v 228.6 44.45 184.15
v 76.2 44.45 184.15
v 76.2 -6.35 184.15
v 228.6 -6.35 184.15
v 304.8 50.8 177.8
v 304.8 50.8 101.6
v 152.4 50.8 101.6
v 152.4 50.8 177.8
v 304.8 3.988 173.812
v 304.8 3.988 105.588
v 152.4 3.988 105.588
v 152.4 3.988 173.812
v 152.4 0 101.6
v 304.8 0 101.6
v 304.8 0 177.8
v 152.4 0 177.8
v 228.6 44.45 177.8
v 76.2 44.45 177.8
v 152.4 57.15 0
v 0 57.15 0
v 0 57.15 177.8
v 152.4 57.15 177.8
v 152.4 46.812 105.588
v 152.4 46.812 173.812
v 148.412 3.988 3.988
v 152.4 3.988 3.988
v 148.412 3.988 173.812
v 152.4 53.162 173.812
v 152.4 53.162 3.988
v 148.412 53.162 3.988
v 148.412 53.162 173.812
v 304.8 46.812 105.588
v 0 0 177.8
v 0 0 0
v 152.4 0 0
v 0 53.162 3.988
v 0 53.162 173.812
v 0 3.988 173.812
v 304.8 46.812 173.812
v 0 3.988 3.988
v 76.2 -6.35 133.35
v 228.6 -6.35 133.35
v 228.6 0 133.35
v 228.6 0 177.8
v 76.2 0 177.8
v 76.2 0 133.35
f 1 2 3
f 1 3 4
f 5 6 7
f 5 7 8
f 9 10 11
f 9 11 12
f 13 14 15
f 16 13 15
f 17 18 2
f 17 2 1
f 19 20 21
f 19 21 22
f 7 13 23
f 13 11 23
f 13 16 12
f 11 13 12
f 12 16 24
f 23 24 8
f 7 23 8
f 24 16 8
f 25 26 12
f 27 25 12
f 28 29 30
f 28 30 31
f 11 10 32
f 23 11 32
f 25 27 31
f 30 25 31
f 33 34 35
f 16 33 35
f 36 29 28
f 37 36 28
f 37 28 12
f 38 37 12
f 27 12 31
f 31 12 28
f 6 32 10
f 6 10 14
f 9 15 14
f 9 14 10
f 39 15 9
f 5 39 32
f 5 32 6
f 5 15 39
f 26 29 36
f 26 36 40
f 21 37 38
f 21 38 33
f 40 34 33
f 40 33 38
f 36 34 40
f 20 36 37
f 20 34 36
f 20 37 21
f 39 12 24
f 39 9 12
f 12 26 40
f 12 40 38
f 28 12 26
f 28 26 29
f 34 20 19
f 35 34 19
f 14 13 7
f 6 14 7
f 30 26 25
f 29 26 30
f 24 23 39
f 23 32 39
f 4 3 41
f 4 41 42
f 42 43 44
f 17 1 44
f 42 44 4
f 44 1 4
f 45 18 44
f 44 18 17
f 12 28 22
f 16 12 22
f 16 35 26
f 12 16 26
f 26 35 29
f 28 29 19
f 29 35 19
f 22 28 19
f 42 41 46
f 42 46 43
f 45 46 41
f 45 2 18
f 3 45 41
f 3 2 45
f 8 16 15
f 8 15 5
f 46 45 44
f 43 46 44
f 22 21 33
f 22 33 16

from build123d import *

# Parameters (mm, degrees)
F0_W      = 152.4
F0_H      = 57.15
F1_DEPTH  = 177.8
F2_T      = -3.9878
F3_DEPTH  = 3.9888
F5_W      = 49.1744
F5_H      = 169.8244
F6_DEPTH  = 3.9878
F7_W      = 50.8
F7_H      = 76.2
F8_DEPTH  = 152.4
F9_T      = -3.9878
F10_DEPTH = 3.9878
F12_W     = 152.4
F12_H     = 50.8
F13_DEPTH = 6.35
F14_W     = 152.4
F14_H     = 6.35
F15_DEPTH = 44.45


with BuildPart() as f1:
    # F0 (on Top) → F1 (new body)
    with BuildSketch(Plane.XY):
        with Locations((76.2, 28.575)):
            Rectangle(F0_W, F0_H)
    extrude(amount=F1_DEPTH)

    # F2
    f2_openings = [f1.faces().sort_by_distance(p)[0] for p in [
        (152.4, 28.575, 88.9),
    ]]
    offset(amount=F2_T, openings=f2_openings)

    # F3 (cut, through all): a face of the model
    f3_faces = [f1.faces().sort_by_distance(p)[0] for p in [
        (3.9878, 28.575, 88.9),
    ]]
    extrude(f3_faces, amount=-F3_DEPTH, mode=Mode.SUBTRACT)


with BuildPart() as f6:
    # F5 (on offset) → F6 (new body)
    with BuildSketch(Plane.YZ.offset(152.4)):
        with Locations((28.575, 88.9)):
            Rectangle(F5_W, F5_H)
    extrude(amount=-F6_DEPTH)


with BuildPart() as f8:
    # F7 (on offset) → F8 (new body)
    with BuildSketch(Plane.YZ.offset(152.4)):
        with Locations((25.4, 139.7)):
            Rectangle(F7_W, F7_H)
    extrude(amount=F8_DEPTH)

    # F9
    f9_openings = [f8.faces().sort_by_distance(p)[0] for p in [
        (304.8, 25.4, 139.7),
    ]]
    offset(amount=F9_T, openings=f9_openings)

    # F10 (cut, through all): a face of the model
    f10_faces = [f8.faces().sort_by_distance(p)[0] for p in [
        (156.3878, 25.4, 139.7),
    ]]
    extrude(f10_faces, amount=-F10_DEPTH, mode=Mode.SUBTRACT)


with BuildPart() as f13:
    # F12 (on mid) → F13 (new body)
    with BuildSketch(Plane.XY.offset(177.8)):
        with Locations((152.4, 19.05)):
            Rectangle(F12_W, F12_H)
    extrude(amount=F13_DEPTH)

    # F14 (on face) → F15 (join)
    with BuildSketch(Plane(origin=(0, 0, 177.8), x_dir=(1, 0, 0), z_dir=(0, 0, -1))):
        with Locations((152.4, 3.175)):
            Rectangle(F14_W, F14_H)
    extrude(amount=F15_DEPTH)


solid = Compound([f1.part, f6.part, f8.part, f13.part])
